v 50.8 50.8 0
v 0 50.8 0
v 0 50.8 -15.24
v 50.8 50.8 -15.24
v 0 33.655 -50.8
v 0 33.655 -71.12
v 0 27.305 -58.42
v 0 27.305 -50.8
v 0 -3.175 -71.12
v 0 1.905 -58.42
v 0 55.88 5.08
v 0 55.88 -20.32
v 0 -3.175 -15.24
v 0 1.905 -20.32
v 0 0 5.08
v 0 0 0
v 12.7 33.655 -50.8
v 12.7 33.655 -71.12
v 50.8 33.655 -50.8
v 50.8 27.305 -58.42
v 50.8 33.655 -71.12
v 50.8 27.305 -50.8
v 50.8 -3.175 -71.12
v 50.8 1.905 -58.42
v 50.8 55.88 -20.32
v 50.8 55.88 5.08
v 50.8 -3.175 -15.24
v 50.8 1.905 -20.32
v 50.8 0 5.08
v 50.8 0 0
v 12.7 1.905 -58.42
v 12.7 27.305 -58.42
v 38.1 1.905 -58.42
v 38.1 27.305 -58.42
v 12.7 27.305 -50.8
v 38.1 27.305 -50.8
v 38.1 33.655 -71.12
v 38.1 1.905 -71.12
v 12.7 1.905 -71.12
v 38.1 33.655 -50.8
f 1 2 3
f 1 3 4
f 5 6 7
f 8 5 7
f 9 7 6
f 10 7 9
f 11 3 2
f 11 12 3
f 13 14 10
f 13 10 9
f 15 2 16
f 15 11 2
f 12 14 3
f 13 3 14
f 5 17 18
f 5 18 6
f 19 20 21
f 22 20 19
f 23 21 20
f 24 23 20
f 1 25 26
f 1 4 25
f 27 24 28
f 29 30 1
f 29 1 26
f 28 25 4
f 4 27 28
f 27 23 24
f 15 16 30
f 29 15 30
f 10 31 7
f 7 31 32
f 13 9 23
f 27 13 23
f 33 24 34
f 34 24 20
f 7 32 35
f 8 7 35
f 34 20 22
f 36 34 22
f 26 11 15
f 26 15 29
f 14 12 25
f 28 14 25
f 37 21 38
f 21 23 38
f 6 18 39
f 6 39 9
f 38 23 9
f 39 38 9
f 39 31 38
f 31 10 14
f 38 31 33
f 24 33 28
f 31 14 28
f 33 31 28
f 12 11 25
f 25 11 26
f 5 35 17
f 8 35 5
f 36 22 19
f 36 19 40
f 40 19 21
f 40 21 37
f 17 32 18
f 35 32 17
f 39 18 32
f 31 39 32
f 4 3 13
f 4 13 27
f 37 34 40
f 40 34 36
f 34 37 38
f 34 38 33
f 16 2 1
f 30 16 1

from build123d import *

# Parameters (mm, degrees)
F0_W      = 50.8
F0_H      = 55.88
F1_DEPTH  = 5.08
F2_W      = 50.8
F2_H      = 5.08
F3_DEPTH  = 20.32
F4_W      = 50.8
F4_H      = 5.08
F5_DEPTH  = 53.975
F6_W      = 50.8
F6_H      = 5.08
F7_DEPTH  = 50.8
F8_W      = 12.7
F8_H      = 20.32
F9_DEPTH  = 31.75
F10_W     = 25.4
F10_H     = 7.62
F11_DEPTH = 50.8


with BuildPart() as f1:
    # F0 (on Top) → F1 (new body)
    with BuildSketch(Plane.XY):
        with Locations((25.4, 27.94)):
            Rectangle(F0_W, F0_H)
    extrude(amount=F1_DEPTH)

    # F2 (on face) → F3 (join)
    with BuildSketch(Plane(origin=(0, 0, 0), x_dir=(1, 0, 0), z_dir=(0, 0, -1))):
        with Locations((25.4, -53.34)):
            Rectangle(F2_W, F2_H)
    extrude(amount=F3_DEPTH)

    # F4 (on face) → F5 (join)
    with BuildSketch(Plane.XZ.offset(-50.8)):
        with Locations((25.4, -17.78)):
            Rectangle(F4_W, F4_H)
    extrude(amount=F5_DEPTH)

    # F6 (on face) → F7 (join)
    with BuildSketch(Plane(origin=(0, 0, -20.32), x_dir=(1, 0, 0), z_dir=(0, 0, -1))):
        with Locations((25.4, 0.635)):
            Rectangle(F6_W, F6_H)
    extrude(amount=F7_DEPTH)

    # F8 (on face) → F9 (join)
    with BuildSketch(Plane(origin=(0, 1.905, 0), x_dir=(-1, 0, 0), z_dir=(0, 1, 0))):
        with Locations((-44.45, -60.96)):
            Rectangle(F8_W, F8_H)
        with Locations((-6.35, -60.96)):
            Rectangle(F8_W, F8_H)
    extrude(amount=F9_DEPTH)

    # F10 (on face) → F11 (cut)
    with BuildSketch(Plane.YZ.offset(50.8)):
        with Locations((14.605, -54.61)):
            Rectangle(F10_W, F10_H)
    extrude(amount=-F11_DEPTH, mode=Mode.SUBTRACT)


solid = f1.part
